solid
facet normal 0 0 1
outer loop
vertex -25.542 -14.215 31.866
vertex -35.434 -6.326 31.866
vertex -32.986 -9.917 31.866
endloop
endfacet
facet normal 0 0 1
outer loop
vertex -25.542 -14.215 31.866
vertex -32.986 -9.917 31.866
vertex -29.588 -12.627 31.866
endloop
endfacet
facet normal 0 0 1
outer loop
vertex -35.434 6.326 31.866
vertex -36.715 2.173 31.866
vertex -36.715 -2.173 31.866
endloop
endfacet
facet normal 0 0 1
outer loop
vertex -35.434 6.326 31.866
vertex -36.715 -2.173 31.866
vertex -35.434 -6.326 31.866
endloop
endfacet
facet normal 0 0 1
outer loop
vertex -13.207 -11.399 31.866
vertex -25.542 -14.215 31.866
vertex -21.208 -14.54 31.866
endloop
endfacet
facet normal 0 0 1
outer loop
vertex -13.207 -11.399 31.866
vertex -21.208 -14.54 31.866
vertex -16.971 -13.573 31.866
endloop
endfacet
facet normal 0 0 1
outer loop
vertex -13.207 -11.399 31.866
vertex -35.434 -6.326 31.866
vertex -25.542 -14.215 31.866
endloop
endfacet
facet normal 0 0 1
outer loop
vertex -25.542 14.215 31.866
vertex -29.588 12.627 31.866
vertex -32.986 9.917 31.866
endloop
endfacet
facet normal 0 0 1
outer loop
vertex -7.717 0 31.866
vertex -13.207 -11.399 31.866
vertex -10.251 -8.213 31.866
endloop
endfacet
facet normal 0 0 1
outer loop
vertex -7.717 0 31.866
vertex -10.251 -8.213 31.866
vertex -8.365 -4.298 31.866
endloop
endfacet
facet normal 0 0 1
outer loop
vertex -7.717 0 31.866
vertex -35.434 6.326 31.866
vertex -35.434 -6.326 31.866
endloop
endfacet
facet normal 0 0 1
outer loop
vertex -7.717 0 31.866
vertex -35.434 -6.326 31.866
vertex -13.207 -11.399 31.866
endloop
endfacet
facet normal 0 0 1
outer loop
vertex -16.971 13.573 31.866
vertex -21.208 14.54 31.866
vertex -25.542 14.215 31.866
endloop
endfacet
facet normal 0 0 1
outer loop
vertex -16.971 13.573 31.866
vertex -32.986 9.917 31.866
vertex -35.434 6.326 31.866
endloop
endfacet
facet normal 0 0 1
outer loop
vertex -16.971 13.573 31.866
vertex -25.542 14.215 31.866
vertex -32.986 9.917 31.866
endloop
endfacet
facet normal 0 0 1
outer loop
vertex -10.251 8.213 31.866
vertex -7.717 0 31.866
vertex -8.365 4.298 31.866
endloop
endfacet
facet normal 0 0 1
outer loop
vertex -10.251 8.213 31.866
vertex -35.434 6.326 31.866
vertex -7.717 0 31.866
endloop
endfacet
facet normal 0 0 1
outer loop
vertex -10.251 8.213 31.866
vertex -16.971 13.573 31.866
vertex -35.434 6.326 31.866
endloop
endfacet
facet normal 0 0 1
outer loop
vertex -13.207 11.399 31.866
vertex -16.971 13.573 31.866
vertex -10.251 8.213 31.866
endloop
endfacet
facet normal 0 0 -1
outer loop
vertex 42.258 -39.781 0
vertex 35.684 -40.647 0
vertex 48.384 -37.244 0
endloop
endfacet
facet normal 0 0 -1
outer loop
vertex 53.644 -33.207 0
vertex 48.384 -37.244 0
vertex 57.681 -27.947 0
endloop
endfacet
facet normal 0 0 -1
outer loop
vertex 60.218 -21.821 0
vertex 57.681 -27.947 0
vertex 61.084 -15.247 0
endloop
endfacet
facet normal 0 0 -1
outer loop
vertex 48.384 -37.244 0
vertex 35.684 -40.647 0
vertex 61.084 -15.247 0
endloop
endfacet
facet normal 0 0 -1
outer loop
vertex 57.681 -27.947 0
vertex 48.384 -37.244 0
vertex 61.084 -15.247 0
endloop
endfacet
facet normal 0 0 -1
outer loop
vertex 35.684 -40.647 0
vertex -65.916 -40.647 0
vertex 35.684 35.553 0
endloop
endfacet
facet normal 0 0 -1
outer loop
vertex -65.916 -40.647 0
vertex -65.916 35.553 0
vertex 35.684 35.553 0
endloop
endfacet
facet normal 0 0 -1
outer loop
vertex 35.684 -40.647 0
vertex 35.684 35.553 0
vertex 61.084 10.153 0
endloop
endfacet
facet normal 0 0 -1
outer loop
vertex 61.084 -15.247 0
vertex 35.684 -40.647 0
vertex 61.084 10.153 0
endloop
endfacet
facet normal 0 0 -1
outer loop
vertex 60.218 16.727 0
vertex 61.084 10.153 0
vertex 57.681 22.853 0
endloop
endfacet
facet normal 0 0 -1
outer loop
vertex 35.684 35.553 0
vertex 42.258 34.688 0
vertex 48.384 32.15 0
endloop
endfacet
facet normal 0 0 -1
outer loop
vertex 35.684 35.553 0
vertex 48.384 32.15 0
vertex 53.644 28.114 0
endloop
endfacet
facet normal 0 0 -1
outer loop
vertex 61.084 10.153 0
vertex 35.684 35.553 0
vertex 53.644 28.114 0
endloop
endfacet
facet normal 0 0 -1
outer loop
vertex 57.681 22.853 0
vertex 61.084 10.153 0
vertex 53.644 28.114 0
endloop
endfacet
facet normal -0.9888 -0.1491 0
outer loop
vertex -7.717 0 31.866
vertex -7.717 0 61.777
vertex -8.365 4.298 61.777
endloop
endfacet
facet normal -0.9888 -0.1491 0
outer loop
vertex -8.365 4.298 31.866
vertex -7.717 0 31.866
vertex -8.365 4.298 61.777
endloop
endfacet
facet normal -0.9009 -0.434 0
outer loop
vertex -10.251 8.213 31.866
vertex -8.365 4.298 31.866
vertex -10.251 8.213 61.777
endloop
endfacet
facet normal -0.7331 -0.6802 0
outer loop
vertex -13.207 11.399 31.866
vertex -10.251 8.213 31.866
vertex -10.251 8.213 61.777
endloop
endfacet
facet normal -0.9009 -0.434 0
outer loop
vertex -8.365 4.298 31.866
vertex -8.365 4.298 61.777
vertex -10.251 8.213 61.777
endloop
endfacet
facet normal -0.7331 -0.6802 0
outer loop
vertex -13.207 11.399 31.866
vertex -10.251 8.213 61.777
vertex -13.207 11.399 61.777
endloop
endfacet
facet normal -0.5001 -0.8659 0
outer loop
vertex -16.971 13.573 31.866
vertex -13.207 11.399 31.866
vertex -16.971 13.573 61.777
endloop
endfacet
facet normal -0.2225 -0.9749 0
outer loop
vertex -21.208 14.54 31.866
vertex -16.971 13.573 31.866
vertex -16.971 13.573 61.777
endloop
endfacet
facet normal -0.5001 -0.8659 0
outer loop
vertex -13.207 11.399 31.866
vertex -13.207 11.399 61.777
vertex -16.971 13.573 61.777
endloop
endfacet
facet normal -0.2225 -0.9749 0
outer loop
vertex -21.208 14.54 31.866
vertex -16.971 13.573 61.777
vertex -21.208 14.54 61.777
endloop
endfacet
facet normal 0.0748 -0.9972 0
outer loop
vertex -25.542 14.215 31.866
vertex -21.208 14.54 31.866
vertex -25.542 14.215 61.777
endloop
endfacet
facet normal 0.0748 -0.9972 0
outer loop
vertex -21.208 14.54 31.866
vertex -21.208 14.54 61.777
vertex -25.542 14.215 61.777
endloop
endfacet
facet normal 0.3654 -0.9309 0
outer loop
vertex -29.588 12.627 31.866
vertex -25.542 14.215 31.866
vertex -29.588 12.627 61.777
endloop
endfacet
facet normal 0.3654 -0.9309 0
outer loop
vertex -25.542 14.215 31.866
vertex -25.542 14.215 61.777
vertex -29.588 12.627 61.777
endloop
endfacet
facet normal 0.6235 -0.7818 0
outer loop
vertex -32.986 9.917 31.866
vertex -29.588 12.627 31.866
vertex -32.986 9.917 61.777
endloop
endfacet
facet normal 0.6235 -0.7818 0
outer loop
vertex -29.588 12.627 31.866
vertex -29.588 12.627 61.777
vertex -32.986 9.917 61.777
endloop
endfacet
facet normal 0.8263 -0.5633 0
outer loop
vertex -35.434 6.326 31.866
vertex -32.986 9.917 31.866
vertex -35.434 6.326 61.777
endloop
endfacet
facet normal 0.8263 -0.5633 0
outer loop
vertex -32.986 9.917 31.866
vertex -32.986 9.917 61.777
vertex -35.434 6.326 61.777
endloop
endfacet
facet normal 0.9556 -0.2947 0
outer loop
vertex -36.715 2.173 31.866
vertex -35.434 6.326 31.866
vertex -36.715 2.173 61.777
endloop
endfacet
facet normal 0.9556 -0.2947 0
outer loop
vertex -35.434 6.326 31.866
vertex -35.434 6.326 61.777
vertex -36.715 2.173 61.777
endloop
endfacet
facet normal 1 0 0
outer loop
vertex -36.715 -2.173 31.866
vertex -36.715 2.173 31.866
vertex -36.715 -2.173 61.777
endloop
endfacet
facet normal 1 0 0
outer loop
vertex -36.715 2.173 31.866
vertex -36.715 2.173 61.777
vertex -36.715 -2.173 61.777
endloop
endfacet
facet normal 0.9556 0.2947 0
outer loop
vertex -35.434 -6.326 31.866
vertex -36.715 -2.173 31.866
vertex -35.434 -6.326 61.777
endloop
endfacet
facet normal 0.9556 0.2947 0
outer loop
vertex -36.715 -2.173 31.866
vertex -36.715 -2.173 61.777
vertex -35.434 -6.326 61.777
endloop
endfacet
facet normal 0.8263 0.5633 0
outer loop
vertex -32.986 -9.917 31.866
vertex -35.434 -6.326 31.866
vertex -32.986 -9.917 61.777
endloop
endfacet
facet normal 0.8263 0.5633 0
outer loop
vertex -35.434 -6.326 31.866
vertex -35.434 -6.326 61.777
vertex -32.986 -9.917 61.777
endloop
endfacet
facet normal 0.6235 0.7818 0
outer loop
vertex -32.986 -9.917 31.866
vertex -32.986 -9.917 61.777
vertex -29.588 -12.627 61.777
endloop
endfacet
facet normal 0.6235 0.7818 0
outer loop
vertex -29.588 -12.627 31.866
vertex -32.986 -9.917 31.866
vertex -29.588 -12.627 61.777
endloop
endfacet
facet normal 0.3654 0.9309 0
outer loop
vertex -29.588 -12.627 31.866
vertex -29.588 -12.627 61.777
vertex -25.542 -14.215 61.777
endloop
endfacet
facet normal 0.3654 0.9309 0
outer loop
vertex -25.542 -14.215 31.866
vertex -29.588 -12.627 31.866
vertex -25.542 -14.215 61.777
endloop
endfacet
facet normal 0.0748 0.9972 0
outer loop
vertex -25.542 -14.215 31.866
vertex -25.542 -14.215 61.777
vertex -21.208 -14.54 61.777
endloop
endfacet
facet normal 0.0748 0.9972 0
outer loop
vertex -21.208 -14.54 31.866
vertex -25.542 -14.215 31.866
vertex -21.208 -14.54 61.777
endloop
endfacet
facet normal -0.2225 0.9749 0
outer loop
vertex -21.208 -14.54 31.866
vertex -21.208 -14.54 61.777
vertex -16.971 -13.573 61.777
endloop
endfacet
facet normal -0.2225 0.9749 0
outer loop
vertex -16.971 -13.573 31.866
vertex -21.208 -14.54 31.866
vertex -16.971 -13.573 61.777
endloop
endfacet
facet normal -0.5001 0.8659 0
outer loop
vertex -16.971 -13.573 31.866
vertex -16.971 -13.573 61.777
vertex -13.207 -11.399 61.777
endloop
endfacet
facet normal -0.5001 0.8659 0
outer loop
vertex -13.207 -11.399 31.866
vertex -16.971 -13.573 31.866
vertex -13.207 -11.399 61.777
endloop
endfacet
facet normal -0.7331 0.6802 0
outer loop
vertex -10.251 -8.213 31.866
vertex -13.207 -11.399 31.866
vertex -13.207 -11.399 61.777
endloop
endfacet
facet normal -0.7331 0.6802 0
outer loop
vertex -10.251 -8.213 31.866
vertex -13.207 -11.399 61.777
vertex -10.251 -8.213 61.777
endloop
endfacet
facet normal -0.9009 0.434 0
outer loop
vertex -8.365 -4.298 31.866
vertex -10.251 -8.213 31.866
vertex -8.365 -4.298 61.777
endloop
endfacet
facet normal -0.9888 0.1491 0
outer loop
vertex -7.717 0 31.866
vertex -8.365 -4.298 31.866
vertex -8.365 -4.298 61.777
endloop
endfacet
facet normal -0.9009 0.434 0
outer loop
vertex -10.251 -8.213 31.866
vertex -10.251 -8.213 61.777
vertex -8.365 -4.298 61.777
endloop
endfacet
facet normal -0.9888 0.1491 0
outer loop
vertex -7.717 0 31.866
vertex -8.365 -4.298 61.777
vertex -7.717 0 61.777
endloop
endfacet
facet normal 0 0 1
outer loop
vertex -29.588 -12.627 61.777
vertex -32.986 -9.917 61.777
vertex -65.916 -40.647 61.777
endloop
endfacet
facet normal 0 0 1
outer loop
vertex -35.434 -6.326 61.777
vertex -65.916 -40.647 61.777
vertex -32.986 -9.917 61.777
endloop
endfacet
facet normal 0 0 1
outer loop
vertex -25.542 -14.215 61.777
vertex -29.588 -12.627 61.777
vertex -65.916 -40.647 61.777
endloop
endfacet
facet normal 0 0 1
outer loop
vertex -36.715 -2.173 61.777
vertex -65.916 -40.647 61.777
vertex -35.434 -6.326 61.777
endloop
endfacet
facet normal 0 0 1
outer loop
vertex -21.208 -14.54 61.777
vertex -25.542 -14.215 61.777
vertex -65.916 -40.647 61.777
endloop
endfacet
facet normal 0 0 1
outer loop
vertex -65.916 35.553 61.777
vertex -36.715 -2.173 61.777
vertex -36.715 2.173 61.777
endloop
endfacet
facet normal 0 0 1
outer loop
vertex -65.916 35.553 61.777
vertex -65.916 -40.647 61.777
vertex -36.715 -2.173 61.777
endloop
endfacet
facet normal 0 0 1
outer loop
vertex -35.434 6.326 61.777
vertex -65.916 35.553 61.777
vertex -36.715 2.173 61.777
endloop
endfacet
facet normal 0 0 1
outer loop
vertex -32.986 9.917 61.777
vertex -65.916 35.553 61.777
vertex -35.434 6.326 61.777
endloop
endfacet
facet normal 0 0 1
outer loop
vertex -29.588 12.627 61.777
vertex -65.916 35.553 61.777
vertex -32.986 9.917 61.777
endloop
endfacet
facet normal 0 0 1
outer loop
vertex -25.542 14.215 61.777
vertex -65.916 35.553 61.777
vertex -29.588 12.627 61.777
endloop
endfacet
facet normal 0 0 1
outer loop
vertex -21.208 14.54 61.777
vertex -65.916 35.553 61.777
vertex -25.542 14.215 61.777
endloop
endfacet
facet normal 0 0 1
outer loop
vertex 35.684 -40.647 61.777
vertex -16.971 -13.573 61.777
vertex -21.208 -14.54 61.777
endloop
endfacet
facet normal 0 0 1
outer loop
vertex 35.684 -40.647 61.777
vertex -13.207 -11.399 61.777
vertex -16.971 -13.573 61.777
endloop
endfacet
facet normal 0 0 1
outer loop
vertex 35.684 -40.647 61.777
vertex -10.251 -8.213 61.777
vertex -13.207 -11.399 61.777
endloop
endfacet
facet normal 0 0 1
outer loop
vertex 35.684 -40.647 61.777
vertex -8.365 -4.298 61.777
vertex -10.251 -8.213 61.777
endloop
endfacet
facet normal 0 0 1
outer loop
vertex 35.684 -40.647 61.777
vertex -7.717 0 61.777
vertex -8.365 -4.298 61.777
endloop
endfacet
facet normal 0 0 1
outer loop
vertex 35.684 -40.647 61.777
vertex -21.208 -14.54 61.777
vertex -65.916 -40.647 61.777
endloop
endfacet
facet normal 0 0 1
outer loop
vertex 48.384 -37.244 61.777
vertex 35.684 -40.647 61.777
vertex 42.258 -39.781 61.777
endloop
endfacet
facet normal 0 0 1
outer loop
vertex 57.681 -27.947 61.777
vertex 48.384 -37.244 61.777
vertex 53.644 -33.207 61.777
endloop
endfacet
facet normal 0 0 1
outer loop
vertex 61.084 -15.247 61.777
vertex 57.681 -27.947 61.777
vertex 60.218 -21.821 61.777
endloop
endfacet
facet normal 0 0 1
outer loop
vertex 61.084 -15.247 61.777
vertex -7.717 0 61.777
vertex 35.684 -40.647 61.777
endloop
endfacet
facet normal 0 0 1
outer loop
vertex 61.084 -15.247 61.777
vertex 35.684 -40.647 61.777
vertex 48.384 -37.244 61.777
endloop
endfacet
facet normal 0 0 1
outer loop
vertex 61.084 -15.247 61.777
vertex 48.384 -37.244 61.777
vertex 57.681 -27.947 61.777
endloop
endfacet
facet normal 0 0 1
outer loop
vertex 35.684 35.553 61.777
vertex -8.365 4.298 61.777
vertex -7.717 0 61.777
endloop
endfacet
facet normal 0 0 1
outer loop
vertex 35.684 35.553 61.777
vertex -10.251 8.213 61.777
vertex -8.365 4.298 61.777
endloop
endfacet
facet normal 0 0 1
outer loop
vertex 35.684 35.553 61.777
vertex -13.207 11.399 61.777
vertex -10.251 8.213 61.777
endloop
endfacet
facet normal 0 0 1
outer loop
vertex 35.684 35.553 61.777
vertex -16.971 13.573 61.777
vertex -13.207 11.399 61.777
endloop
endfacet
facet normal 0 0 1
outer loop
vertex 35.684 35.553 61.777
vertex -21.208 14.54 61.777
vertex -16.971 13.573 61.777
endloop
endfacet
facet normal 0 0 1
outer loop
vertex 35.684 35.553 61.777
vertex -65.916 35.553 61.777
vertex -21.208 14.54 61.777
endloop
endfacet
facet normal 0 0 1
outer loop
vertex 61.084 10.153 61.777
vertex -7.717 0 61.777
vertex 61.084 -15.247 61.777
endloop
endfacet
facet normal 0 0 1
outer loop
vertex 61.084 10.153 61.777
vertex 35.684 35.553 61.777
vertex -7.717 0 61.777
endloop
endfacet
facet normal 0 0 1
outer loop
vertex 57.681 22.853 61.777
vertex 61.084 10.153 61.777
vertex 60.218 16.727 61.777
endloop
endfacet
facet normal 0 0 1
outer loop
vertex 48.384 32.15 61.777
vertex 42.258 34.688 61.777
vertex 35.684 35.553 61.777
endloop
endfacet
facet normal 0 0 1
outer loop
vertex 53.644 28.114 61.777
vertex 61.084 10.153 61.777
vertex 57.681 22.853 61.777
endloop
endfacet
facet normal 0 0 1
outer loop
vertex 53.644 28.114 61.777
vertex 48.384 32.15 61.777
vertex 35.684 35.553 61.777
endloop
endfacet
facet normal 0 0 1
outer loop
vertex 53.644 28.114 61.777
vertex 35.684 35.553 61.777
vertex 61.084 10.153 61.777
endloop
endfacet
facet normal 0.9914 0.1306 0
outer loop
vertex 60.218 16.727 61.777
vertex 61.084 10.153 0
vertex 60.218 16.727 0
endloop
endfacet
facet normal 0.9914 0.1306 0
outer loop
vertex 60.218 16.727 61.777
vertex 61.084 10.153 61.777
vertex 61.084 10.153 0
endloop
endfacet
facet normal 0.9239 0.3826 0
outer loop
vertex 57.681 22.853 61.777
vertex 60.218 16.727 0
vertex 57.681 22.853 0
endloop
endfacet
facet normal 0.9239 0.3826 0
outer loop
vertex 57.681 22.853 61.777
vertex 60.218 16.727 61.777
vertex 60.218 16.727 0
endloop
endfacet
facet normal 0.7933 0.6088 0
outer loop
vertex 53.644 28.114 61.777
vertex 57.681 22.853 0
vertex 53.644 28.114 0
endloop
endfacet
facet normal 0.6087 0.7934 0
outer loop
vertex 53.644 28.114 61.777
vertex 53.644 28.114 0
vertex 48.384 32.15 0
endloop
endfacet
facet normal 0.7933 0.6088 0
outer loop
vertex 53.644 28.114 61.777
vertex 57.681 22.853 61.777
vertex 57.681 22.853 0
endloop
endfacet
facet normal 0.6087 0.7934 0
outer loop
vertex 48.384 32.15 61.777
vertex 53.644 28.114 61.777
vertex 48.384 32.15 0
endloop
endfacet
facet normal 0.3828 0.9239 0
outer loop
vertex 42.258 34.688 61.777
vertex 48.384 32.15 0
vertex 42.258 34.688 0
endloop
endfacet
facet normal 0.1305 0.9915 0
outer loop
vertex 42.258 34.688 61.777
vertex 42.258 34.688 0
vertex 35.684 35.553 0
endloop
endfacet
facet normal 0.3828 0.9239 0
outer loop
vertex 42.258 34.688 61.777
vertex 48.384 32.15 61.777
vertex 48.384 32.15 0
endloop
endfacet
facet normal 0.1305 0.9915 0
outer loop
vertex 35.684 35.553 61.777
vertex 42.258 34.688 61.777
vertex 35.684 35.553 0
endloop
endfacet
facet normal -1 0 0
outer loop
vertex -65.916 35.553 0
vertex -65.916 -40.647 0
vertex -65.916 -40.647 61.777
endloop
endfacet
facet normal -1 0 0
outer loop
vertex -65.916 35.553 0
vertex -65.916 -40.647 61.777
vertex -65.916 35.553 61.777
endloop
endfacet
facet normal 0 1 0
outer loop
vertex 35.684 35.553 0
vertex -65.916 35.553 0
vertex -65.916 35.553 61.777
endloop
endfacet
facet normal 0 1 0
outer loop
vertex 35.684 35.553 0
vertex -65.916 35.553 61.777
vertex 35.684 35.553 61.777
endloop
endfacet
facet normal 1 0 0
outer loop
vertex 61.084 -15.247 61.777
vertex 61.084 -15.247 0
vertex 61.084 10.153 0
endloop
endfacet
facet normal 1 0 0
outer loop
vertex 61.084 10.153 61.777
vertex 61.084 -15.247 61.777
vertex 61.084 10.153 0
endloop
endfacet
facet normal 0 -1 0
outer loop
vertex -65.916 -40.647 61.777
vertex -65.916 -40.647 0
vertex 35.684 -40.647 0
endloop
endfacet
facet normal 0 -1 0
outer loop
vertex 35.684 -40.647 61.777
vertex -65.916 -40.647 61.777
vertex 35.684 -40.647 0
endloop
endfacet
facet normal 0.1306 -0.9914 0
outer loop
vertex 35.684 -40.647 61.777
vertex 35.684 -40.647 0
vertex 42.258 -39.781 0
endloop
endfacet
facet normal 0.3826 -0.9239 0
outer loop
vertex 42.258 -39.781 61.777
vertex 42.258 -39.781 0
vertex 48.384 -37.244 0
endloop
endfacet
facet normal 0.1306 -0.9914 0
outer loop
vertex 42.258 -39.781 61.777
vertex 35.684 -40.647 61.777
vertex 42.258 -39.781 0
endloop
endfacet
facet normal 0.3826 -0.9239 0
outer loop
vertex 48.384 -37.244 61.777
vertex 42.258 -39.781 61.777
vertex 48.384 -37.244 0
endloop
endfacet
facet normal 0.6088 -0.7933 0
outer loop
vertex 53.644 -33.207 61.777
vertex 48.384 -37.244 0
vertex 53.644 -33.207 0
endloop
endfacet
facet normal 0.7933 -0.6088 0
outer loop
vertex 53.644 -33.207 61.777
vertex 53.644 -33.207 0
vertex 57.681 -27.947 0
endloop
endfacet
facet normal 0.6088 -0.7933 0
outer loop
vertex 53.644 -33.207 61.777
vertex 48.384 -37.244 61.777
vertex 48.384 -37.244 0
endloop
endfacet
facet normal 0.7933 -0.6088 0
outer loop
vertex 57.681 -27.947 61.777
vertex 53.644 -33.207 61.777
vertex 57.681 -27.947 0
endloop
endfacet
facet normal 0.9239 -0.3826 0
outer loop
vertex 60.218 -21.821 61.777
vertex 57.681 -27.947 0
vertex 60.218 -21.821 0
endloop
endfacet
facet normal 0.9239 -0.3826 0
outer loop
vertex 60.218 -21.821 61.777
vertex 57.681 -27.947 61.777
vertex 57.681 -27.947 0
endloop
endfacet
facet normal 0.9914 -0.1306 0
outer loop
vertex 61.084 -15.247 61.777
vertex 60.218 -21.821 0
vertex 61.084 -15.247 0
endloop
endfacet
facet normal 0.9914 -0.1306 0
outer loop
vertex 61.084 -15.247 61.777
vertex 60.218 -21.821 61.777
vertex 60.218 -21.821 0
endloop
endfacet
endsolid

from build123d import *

# Parameters (mm, degrees)
F0_W     = 127
F0_H     = 76.2
F1_DEPTH = 61.777094
F2_R     = 25.4
F3_R     = 14.58048
F4_DEPTH = 29.911026


with BuildPart() as f1:
    # F0 (on Top) → F1 (new body)
    with BuildSketch(Plane.XY):
        with Locations((-2.416426, -2.546754)):
            Rectangle(F0_W, F0_H)
    extrude(amount=F1_DEPTH)

    # F2
    f2_edges = [f1.edges().sort_by_distance(p)[0] for p in [
        (61.083574, -40.646754, 30.888547),
        (61.083574, 35.553246, 30.888547),
    ]]
    fillet(f2_edges, radius=F2_R)

    # F3 (on face) → F4 (cut)
    with BuildSketch(Plane.XY.offset(61.777094)):
        with Locations((-22.297775, 0)):
            Circle(F3_R)
    extrude(amount=-F4_DEPTH, mode=Mode.SUBTRACT)


solid = f1.part
